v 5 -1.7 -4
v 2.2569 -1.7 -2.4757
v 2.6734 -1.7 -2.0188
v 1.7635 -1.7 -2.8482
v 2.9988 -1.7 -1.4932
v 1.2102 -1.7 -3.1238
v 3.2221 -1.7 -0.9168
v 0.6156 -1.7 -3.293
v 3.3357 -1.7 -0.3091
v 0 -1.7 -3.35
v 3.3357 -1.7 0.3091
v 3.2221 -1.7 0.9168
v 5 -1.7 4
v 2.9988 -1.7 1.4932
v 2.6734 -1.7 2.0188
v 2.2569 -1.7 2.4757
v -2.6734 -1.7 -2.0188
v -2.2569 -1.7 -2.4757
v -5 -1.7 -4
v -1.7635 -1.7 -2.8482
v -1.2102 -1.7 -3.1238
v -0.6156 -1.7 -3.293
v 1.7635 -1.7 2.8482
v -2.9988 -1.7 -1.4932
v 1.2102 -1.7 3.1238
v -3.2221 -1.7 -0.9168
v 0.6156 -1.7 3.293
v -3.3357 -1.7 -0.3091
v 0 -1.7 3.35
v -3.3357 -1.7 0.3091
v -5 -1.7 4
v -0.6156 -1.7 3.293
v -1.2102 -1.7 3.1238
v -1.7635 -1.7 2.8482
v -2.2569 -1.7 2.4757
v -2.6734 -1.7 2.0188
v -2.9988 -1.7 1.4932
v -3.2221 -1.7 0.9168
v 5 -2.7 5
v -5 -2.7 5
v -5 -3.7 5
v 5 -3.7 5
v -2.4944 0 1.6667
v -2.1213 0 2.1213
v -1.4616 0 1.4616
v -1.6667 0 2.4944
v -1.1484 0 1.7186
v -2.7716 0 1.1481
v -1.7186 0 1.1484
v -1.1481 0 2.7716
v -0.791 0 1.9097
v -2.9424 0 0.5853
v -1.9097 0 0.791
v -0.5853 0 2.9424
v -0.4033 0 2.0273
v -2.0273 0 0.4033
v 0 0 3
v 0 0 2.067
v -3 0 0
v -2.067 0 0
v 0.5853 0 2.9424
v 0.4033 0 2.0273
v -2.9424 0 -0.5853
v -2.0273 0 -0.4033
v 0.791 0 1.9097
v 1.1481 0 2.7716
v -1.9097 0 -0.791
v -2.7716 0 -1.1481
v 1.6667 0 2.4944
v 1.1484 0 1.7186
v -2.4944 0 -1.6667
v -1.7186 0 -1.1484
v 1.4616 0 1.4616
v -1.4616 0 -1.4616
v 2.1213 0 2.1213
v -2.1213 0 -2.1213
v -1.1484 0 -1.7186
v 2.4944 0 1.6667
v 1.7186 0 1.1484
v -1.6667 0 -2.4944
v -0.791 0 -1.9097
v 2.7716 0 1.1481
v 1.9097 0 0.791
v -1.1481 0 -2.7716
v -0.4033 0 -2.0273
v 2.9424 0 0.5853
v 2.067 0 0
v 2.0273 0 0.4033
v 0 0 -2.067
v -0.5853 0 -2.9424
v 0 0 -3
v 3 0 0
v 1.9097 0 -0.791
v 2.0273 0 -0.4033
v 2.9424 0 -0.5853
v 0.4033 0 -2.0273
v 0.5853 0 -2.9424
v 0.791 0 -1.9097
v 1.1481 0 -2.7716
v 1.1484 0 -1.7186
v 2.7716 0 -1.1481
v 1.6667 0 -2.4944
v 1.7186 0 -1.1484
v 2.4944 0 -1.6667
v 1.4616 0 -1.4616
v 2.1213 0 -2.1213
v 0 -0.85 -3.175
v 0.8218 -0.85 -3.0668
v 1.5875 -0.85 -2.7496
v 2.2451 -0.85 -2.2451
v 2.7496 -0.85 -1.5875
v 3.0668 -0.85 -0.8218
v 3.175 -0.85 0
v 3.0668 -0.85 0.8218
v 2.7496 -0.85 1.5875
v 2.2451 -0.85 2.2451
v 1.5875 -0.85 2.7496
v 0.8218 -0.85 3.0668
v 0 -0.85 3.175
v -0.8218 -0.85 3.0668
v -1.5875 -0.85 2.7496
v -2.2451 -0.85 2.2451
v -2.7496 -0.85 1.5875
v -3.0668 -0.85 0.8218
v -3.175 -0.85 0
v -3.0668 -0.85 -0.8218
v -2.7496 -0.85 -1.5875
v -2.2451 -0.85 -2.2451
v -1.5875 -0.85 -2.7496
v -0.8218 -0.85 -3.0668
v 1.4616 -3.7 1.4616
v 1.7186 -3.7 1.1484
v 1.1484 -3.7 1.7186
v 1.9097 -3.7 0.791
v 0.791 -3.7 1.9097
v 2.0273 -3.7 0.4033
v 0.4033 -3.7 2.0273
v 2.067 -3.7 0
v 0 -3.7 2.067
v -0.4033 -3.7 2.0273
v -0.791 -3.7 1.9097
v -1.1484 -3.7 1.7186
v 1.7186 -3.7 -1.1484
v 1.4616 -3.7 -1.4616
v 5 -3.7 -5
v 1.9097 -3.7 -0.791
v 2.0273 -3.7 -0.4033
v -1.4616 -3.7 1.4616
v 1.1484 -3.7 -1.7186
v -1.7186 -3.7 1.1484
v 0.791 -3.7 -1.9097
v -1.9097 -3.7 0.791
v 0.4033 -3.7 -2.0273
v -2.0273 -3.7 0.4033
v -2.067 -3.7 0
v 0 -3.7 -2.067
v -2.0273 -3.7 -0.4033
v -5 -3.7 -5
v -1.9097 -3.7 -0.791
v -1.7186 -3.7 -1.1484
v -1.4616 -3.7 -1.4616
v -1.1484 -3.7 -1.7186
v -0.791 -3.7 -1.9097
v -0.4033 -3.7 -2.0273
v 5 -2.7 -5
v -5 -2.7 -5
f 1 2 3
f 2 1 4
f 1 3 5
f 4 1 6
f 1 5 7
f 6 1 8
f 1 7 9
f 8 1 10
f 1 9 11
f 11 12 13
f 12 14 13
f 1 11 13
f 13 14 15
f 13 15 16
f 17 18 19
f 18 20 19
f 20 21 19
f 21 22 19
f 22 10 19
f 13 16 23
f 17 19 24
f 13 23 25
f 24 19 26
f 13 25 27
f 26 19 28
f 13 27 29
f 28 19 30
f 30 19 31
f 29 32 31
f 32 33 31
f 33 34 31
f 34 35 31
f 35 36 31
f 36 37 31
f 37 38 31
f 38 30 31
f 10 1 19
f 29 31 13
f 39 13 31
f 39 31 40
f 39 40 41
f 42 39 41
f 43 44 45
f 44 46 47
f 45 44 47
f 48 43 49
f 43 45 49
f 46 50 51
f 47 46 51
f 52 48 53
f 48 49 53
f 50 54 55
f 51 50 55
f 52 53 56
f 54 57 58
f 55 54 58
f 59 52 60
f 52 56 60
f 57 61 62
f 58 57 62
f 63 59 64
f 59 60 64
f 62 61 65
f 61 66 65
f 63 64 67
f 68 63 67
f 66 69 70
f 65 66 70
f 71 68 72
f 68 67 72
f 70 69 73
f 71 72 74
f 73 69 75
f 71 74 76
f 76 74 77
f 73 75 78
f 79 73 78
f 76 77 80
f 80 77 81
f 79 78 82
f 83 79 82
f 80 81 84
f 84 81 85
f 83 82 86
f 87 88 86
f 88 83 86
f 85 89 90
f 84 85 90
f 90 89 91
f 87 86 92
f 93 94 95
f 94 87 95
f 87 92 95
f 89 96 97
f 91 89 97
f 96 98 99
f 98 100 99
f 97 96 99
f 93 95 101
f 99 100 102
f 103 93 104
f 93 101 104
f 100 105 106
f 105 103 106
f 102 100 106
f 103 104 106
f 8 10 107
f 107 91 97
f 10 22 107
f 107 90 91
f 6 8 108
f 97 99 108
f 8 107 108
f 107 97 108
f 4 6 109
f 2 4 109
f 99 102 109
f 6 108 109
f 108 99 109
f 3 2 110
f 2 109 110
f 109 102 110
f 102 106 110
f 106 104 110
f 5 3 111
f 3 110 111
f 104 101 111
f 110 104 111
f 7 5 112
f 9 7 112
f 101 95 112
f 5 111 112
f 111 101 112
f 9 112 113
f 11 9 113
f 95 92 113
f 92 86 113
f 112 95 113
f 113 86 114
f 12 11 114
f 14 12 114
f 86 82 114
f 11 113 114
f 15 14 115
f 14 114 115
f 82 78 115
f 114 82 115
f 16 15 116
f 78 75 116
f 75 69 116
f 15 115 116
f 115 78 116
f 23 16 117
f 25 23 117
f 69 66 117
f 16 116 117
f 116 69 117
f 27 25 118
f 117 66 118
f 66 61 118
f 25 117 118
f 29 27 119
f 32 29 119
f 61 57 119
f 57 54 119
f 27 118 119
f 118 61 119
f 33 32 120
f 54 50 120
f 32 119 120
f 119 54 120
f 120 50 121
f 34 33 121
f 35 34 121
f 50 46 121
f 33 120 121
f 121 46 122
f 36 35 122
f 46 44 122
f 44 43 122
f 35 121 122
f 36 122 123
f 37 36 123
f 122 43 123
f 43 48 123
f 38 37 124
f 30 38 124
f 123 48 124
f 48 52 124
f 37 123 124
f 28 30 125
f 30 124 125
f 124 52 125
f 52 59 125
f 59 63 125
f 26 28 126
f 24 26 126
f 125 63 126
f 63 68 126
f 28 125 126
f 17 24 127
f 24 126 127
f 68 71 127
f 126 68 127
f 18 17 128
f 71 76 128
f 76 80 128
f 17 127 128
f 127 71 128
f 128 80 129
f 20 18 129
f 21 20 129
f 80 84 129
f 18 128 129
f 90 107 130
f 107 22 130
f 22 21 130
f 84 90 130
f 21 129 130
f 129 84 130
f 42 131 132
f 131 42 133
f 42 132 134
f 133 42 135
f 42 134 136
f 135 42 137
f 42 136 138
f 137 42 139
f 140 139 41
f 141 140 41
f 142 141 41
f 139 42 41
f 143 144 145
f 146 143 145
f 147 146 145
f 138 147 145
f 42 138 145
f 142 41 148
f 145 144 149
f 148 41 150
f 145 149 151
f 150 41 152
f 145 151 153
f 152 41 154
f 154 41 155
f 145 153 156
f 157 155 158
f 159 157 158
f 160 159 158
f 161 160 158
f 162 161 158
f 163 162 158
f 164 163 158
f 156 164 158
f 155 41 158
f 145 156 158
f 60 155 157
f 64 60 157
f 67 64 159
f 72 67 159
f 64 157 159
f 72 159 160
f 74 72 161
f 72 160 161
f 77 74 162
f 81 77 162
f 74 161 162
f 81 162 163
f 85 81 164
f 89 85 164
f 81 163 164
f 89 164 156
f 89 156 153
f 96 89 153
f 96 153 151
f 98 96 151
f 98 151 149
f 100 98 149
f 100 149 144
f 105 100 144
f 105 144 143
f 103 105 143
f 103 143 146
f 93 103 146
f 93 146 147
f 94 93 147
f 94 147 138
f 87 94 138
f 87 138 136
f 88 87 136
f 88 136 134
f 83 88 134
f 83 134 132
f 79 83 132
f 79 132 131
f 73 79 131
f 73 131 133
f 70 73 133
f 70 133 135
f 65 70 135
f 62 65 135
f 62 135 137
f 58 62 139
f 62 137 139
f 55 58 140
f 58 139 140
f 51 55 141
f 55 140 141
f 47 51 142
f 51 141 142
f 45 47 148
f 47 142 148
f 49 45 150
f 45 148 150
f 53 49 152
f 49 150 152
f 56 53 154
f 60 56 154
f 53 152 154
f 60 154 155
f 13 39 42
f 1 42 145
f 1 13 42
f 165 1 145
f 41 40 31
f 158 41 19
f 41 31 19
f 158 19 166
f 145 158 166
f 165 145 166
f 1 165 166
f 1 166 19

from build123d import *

# Parameters (mm, degrees)
BOSS_EXTRUDE1_DEPTH = 10
TAPPED_HOLE1_D      = 4.134


with BuildPart() as part:
    # Sketch1 → Boss-Extrude1 (new body)
    with BuildSketch(Plane(origin=(-5, 0, 0), x_dir=(0, 0, -1), z_dir=(1, 0, 0))):
        Polygon((4, -1.7), (-4, -1.7), (-5, -2.7), (-5, -3.7), (5, -3.7), (5, -2.7), align=None)
    extrude(amount=BOSS_EXTRUDE1_DEPTH)

    # Sketch2 → Revolve1 (revolve)
    with BuildSketch(Plane(origin=(0, 0, 0), x_dir=(0, 0, -1), z_dir=(1, 0, 0))):
        Polygon((3.35, -1.7), (3, 0), (0, 0), (0, -1.7), align=None)
    revolve(axis=Axis((0, 0, 0), (0, -1, 0)))

    # Tapped Hole1 (through all)
    with Locations(Plane(origin=(0, 0, 0), x_dir=(1, 0, 0), z_dir=(0, 1, 0))):
        with Locations((0, 0)):
            Hole(TAPPED_HOLE1_D / 2)


solid = part.part
